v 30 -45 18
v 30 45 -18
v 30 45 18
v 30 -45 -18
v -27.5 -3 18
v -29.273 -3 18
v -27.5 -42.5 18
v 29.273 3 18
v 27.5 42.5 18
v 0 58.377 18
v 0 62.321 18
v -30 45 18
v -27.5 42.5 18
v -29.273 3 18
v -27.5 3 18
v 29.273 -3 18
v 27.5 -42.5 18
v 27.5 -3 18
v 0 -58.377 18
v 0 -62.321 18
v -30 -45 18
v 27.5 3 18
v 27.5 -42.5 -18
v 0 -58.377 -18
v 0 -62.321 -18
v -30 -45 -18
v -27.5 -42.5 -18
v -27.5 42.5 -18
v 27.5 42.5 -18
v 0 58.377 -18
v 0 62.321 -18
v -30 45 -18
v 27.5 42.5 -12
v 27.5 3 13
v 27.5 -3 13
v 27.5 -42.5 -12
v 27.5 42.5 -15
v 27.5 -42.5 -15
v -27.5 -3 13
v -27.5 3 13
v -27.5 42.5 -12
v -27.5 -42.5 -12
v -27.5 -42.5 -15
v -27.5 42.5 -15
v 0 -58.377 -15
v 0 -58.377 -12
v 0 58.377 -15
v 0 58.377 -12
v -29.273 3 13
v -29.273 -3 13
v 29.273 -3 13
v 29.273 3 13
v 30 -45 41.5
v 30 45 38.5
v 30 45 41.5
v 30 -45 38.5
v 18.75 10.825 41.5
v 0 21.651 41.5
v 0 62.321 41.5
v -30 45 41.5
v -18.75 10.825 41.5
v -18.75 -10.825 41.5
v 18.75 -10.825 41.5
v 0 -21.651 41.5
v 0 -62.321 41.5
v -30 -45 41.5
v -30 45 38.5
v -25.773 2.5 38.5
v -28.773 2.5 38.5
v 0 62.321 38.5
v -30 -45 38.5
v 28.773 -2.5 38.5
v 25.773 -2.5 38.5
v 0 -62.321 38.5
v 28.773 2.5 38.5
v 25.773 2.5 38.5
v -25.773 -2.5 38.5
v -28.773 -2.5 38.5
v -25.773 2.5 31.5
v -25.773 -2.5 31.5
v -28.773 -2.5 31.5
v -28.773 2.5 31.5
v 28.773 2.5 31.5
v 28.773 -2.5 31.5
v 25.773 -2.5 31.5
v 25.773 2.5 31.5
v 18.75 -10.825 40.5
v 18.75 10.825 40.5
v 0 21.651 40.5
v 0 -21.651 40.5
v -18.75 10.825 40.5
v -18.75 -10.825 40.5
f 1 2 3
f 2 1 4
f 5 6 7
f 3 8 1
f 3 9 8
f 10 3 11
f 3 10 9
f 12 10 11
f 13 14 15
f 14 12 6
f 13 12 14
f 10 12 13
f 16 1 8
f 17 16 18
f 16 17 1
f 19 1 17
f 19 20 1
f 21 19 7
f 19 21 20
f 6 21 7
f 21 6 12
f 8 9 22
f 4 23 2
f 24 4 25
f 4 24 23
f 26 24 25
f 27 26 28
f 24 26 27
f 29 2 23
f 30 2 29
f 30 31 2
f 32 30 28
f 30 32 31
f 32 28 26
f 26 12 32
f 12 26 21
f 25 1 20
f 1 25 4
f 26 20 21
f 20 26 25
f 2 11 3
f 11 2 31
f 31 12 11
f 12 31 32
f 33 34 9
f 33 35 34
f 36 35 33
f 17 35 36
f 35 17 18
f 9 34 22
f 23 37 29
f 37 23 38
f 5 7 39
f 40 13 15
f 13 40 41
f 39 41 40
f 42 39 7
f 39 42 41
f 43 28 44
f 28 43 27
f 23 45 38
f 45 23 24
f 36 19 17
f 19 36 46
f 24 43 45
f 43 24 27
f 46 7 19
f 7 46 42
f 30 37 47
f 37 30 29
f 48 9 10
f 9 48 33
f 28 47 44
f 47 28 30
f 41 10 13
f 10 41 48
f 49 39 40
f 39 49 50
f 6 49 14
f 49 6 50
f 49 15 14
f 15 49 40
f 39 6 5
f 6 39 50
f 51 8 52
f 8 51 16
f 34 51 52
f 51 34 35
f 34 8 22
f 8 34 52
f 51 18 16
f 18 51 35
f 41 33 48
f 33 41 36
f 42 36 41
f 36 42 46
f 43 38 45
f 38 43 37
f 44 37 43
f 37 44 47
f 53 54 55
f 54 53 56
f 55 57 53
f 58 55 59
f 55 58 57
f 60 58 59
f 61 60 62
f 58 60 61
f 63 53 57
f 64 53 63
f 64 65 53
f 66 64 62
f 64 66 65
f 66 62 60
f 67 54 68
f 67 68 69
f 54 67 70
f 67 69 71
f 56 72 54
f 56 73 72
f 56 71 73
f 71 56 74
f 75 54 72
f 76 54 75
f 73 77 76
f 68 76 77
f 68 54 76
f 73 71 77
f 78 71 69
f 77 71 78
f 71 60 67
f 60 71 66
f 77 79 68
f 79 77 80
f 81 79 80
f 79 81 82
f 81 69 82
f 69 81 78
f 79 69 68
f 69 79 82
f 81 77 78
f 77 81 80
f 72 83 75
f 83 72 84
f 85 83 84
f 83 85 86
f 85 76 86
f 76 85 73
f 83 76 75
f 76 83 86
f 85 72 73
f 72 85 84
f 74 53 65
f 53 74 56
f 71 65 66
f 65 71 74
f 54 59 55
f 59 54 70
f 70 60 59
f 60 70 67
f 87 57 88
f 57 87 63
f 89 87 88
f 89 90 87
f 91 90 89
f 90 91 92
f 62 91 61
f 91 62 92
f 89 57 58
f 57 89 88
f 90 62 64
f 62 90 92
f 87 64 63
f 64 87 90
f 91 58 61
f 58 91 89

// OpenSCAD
$fn = 100;

// Functions for calculating the half-hexagons
function edge_length(width) = (width/2) / cos(30); // CAH
function point_height(width) = (width/2) * tan(30); // TOA
function leg(width) = edge_length(width) * sqrt(1/2);
function x_offset(width) = (width/2) - leg(width) * cos(15);
function y_offset(width, length) = length/2 - (leg(width) * sin(15));

// Core size variables
lip = 3;
h = 33+lip;
w = 60;
l = 90;

// Values for interior space
h_pad = -1;
w_pad = 5;
l_pad = 5;

difference(){
// The exterior shape
union(){
cube([w, l, h], center=true); // Center Cube
translate([x_offset(w),-y_offset(w,l),0]){
	rotate([0,0,30]) cube([edge_length(w),edge_length(w),h], center=true);
}
translate([-x_offset(w),-y_offset(w,l),0]){
	rotate([0,0,-30]) cube([edge_length(w),edge_length(w),h], center=true);
}

translate([x_offset(w),y_offset(w,l),0]){
	rotate([0,0,-30]) cube([edge_length(w),edge_length(w),h], center=true);
}
translate([-x_offset(w),y_offset(w,l),0]){
	rotate([0,0,30]) cube([edge_length(w),edge_length(w),h], center=true);
}}

// The teeth
translate([-w/2.2,0,h/2]){cube([4, 6, 10], center=true);}
translate([w/2.2,0,h/2]){cube([4, 6, 10], center=true);}

// The interior shape
translate([0,0,0]){
union(){
cube([w-w_pad, l-l_pad, h-h_pad], center=true); // Center Cube
translate([x_offset(w-w_pad),-y_offset(w-w_pad,l-l_pad),0]){
	rotate([0,0,30]) cube([edge_length(w-w_pad),edge_length(w-w_pad),h-h_pad], center=true);
}
translate([-x_offset(w-w_pad),-y_offset(w-w_pad,l-l_pad),0]){
	rotate([0,0,-30]) cube([edge_length(w-w_pad),edge_length(w-w_pad),h-h_pad], center=true);
}

translate([x_offset(w-w_pad),y_offset(w-w_pad,l-l_pad),0]){
	rotate([0,0,-30]) cube([edge_length(w-w_pad),edge_length(w-w_pad),h-h_pad], center=true);
}
translate([-x_offset(w-w_pad),y_offset(w-w_pad,l-l_pad),0]){
	rotate([0,0,30]) cube([edge_length(w-w_pad),edge_length(w-w_pad),h-h_pad], center=true);
}}}}

// The floor of the case
translate([0,0,-(h/2)+(h_lid/2)+lip]){
union(){
cube([w, l, h_lid], center=true); // Center Cube
translate([x_offset(w),-y_offset(w,l),0]){
	rotate([0,0,30]) cube([edge_length(w),edge_length(w),h_lid], center=true);
}
translate([-x_offset(w),-y_offset(w,l),0]){
	rotate([0,0,-30]) cube([edge_length(w),edge_length(w),h_lid], center=true);
}

translate([x_offset(w),y_offset(w,l),0]){
	rotate([0,0,-30]) cube([edge_length(w),edge_length(w),h_lid], center=true);
}
translate([-x_offset(w),y_offset(w,l),0]){
	rotate([0,0,30]) cube([edge_length(w),edge_length(w),h_lid], center=true);
}}}


// The lid
h_lid = 3;
function hex_len(width) = 2 * (cos(30) * width);
hex_edge = edge_length(w/1.6);

translate([0,0,40]){
difference(){
union(){
cube([w, l, h_lid], center=true); // Center Cube
translate([-w/2.2,0,-h_lid*1.5]){cube([3, 5, 8], center=true);} // The teeth
translate([w/2.2,0,-h_lid*1.5]){cube([3, 5, 8], center=true);}
translate([x_offset(w),-y_offset(w,l),0]){
	rotate([0,0,30]) cube([edge_length(w),edge_length(w),h_lid], center=true);
}
translate([-x_offset(w),-y_offset(w,l),0]){
	rotate([0,0,-30]) cube([edge_length(w),edge_length(w),h_lid], center=true);
}

translate([x_offset(w),y_offset(w,l),0]){
	rotate([0,0,-30]) cube([edge_length(w),edge_length(w),h_lid], center=true);
}
translate([-x_offset(w),y_offset(w,l),0]){
	rotate([0,0,30]) cube([edge_length(w),edge_length(w),h_lid], center=true);
}}

// The cutout
translate([0,0,2]){
union(){
	rotate([0,0,0]) cube([hex_len(hex_edge),hex_edge,h_lid], center=true);
	rotate([0,0,60]) cube([hex_len(hex_edge),hex_edge,h_lid], center=true);
	rotate([0,0,120]) cube([hex_len(hex_edge),hex_edge,h_lid], center=true);
}}}}
